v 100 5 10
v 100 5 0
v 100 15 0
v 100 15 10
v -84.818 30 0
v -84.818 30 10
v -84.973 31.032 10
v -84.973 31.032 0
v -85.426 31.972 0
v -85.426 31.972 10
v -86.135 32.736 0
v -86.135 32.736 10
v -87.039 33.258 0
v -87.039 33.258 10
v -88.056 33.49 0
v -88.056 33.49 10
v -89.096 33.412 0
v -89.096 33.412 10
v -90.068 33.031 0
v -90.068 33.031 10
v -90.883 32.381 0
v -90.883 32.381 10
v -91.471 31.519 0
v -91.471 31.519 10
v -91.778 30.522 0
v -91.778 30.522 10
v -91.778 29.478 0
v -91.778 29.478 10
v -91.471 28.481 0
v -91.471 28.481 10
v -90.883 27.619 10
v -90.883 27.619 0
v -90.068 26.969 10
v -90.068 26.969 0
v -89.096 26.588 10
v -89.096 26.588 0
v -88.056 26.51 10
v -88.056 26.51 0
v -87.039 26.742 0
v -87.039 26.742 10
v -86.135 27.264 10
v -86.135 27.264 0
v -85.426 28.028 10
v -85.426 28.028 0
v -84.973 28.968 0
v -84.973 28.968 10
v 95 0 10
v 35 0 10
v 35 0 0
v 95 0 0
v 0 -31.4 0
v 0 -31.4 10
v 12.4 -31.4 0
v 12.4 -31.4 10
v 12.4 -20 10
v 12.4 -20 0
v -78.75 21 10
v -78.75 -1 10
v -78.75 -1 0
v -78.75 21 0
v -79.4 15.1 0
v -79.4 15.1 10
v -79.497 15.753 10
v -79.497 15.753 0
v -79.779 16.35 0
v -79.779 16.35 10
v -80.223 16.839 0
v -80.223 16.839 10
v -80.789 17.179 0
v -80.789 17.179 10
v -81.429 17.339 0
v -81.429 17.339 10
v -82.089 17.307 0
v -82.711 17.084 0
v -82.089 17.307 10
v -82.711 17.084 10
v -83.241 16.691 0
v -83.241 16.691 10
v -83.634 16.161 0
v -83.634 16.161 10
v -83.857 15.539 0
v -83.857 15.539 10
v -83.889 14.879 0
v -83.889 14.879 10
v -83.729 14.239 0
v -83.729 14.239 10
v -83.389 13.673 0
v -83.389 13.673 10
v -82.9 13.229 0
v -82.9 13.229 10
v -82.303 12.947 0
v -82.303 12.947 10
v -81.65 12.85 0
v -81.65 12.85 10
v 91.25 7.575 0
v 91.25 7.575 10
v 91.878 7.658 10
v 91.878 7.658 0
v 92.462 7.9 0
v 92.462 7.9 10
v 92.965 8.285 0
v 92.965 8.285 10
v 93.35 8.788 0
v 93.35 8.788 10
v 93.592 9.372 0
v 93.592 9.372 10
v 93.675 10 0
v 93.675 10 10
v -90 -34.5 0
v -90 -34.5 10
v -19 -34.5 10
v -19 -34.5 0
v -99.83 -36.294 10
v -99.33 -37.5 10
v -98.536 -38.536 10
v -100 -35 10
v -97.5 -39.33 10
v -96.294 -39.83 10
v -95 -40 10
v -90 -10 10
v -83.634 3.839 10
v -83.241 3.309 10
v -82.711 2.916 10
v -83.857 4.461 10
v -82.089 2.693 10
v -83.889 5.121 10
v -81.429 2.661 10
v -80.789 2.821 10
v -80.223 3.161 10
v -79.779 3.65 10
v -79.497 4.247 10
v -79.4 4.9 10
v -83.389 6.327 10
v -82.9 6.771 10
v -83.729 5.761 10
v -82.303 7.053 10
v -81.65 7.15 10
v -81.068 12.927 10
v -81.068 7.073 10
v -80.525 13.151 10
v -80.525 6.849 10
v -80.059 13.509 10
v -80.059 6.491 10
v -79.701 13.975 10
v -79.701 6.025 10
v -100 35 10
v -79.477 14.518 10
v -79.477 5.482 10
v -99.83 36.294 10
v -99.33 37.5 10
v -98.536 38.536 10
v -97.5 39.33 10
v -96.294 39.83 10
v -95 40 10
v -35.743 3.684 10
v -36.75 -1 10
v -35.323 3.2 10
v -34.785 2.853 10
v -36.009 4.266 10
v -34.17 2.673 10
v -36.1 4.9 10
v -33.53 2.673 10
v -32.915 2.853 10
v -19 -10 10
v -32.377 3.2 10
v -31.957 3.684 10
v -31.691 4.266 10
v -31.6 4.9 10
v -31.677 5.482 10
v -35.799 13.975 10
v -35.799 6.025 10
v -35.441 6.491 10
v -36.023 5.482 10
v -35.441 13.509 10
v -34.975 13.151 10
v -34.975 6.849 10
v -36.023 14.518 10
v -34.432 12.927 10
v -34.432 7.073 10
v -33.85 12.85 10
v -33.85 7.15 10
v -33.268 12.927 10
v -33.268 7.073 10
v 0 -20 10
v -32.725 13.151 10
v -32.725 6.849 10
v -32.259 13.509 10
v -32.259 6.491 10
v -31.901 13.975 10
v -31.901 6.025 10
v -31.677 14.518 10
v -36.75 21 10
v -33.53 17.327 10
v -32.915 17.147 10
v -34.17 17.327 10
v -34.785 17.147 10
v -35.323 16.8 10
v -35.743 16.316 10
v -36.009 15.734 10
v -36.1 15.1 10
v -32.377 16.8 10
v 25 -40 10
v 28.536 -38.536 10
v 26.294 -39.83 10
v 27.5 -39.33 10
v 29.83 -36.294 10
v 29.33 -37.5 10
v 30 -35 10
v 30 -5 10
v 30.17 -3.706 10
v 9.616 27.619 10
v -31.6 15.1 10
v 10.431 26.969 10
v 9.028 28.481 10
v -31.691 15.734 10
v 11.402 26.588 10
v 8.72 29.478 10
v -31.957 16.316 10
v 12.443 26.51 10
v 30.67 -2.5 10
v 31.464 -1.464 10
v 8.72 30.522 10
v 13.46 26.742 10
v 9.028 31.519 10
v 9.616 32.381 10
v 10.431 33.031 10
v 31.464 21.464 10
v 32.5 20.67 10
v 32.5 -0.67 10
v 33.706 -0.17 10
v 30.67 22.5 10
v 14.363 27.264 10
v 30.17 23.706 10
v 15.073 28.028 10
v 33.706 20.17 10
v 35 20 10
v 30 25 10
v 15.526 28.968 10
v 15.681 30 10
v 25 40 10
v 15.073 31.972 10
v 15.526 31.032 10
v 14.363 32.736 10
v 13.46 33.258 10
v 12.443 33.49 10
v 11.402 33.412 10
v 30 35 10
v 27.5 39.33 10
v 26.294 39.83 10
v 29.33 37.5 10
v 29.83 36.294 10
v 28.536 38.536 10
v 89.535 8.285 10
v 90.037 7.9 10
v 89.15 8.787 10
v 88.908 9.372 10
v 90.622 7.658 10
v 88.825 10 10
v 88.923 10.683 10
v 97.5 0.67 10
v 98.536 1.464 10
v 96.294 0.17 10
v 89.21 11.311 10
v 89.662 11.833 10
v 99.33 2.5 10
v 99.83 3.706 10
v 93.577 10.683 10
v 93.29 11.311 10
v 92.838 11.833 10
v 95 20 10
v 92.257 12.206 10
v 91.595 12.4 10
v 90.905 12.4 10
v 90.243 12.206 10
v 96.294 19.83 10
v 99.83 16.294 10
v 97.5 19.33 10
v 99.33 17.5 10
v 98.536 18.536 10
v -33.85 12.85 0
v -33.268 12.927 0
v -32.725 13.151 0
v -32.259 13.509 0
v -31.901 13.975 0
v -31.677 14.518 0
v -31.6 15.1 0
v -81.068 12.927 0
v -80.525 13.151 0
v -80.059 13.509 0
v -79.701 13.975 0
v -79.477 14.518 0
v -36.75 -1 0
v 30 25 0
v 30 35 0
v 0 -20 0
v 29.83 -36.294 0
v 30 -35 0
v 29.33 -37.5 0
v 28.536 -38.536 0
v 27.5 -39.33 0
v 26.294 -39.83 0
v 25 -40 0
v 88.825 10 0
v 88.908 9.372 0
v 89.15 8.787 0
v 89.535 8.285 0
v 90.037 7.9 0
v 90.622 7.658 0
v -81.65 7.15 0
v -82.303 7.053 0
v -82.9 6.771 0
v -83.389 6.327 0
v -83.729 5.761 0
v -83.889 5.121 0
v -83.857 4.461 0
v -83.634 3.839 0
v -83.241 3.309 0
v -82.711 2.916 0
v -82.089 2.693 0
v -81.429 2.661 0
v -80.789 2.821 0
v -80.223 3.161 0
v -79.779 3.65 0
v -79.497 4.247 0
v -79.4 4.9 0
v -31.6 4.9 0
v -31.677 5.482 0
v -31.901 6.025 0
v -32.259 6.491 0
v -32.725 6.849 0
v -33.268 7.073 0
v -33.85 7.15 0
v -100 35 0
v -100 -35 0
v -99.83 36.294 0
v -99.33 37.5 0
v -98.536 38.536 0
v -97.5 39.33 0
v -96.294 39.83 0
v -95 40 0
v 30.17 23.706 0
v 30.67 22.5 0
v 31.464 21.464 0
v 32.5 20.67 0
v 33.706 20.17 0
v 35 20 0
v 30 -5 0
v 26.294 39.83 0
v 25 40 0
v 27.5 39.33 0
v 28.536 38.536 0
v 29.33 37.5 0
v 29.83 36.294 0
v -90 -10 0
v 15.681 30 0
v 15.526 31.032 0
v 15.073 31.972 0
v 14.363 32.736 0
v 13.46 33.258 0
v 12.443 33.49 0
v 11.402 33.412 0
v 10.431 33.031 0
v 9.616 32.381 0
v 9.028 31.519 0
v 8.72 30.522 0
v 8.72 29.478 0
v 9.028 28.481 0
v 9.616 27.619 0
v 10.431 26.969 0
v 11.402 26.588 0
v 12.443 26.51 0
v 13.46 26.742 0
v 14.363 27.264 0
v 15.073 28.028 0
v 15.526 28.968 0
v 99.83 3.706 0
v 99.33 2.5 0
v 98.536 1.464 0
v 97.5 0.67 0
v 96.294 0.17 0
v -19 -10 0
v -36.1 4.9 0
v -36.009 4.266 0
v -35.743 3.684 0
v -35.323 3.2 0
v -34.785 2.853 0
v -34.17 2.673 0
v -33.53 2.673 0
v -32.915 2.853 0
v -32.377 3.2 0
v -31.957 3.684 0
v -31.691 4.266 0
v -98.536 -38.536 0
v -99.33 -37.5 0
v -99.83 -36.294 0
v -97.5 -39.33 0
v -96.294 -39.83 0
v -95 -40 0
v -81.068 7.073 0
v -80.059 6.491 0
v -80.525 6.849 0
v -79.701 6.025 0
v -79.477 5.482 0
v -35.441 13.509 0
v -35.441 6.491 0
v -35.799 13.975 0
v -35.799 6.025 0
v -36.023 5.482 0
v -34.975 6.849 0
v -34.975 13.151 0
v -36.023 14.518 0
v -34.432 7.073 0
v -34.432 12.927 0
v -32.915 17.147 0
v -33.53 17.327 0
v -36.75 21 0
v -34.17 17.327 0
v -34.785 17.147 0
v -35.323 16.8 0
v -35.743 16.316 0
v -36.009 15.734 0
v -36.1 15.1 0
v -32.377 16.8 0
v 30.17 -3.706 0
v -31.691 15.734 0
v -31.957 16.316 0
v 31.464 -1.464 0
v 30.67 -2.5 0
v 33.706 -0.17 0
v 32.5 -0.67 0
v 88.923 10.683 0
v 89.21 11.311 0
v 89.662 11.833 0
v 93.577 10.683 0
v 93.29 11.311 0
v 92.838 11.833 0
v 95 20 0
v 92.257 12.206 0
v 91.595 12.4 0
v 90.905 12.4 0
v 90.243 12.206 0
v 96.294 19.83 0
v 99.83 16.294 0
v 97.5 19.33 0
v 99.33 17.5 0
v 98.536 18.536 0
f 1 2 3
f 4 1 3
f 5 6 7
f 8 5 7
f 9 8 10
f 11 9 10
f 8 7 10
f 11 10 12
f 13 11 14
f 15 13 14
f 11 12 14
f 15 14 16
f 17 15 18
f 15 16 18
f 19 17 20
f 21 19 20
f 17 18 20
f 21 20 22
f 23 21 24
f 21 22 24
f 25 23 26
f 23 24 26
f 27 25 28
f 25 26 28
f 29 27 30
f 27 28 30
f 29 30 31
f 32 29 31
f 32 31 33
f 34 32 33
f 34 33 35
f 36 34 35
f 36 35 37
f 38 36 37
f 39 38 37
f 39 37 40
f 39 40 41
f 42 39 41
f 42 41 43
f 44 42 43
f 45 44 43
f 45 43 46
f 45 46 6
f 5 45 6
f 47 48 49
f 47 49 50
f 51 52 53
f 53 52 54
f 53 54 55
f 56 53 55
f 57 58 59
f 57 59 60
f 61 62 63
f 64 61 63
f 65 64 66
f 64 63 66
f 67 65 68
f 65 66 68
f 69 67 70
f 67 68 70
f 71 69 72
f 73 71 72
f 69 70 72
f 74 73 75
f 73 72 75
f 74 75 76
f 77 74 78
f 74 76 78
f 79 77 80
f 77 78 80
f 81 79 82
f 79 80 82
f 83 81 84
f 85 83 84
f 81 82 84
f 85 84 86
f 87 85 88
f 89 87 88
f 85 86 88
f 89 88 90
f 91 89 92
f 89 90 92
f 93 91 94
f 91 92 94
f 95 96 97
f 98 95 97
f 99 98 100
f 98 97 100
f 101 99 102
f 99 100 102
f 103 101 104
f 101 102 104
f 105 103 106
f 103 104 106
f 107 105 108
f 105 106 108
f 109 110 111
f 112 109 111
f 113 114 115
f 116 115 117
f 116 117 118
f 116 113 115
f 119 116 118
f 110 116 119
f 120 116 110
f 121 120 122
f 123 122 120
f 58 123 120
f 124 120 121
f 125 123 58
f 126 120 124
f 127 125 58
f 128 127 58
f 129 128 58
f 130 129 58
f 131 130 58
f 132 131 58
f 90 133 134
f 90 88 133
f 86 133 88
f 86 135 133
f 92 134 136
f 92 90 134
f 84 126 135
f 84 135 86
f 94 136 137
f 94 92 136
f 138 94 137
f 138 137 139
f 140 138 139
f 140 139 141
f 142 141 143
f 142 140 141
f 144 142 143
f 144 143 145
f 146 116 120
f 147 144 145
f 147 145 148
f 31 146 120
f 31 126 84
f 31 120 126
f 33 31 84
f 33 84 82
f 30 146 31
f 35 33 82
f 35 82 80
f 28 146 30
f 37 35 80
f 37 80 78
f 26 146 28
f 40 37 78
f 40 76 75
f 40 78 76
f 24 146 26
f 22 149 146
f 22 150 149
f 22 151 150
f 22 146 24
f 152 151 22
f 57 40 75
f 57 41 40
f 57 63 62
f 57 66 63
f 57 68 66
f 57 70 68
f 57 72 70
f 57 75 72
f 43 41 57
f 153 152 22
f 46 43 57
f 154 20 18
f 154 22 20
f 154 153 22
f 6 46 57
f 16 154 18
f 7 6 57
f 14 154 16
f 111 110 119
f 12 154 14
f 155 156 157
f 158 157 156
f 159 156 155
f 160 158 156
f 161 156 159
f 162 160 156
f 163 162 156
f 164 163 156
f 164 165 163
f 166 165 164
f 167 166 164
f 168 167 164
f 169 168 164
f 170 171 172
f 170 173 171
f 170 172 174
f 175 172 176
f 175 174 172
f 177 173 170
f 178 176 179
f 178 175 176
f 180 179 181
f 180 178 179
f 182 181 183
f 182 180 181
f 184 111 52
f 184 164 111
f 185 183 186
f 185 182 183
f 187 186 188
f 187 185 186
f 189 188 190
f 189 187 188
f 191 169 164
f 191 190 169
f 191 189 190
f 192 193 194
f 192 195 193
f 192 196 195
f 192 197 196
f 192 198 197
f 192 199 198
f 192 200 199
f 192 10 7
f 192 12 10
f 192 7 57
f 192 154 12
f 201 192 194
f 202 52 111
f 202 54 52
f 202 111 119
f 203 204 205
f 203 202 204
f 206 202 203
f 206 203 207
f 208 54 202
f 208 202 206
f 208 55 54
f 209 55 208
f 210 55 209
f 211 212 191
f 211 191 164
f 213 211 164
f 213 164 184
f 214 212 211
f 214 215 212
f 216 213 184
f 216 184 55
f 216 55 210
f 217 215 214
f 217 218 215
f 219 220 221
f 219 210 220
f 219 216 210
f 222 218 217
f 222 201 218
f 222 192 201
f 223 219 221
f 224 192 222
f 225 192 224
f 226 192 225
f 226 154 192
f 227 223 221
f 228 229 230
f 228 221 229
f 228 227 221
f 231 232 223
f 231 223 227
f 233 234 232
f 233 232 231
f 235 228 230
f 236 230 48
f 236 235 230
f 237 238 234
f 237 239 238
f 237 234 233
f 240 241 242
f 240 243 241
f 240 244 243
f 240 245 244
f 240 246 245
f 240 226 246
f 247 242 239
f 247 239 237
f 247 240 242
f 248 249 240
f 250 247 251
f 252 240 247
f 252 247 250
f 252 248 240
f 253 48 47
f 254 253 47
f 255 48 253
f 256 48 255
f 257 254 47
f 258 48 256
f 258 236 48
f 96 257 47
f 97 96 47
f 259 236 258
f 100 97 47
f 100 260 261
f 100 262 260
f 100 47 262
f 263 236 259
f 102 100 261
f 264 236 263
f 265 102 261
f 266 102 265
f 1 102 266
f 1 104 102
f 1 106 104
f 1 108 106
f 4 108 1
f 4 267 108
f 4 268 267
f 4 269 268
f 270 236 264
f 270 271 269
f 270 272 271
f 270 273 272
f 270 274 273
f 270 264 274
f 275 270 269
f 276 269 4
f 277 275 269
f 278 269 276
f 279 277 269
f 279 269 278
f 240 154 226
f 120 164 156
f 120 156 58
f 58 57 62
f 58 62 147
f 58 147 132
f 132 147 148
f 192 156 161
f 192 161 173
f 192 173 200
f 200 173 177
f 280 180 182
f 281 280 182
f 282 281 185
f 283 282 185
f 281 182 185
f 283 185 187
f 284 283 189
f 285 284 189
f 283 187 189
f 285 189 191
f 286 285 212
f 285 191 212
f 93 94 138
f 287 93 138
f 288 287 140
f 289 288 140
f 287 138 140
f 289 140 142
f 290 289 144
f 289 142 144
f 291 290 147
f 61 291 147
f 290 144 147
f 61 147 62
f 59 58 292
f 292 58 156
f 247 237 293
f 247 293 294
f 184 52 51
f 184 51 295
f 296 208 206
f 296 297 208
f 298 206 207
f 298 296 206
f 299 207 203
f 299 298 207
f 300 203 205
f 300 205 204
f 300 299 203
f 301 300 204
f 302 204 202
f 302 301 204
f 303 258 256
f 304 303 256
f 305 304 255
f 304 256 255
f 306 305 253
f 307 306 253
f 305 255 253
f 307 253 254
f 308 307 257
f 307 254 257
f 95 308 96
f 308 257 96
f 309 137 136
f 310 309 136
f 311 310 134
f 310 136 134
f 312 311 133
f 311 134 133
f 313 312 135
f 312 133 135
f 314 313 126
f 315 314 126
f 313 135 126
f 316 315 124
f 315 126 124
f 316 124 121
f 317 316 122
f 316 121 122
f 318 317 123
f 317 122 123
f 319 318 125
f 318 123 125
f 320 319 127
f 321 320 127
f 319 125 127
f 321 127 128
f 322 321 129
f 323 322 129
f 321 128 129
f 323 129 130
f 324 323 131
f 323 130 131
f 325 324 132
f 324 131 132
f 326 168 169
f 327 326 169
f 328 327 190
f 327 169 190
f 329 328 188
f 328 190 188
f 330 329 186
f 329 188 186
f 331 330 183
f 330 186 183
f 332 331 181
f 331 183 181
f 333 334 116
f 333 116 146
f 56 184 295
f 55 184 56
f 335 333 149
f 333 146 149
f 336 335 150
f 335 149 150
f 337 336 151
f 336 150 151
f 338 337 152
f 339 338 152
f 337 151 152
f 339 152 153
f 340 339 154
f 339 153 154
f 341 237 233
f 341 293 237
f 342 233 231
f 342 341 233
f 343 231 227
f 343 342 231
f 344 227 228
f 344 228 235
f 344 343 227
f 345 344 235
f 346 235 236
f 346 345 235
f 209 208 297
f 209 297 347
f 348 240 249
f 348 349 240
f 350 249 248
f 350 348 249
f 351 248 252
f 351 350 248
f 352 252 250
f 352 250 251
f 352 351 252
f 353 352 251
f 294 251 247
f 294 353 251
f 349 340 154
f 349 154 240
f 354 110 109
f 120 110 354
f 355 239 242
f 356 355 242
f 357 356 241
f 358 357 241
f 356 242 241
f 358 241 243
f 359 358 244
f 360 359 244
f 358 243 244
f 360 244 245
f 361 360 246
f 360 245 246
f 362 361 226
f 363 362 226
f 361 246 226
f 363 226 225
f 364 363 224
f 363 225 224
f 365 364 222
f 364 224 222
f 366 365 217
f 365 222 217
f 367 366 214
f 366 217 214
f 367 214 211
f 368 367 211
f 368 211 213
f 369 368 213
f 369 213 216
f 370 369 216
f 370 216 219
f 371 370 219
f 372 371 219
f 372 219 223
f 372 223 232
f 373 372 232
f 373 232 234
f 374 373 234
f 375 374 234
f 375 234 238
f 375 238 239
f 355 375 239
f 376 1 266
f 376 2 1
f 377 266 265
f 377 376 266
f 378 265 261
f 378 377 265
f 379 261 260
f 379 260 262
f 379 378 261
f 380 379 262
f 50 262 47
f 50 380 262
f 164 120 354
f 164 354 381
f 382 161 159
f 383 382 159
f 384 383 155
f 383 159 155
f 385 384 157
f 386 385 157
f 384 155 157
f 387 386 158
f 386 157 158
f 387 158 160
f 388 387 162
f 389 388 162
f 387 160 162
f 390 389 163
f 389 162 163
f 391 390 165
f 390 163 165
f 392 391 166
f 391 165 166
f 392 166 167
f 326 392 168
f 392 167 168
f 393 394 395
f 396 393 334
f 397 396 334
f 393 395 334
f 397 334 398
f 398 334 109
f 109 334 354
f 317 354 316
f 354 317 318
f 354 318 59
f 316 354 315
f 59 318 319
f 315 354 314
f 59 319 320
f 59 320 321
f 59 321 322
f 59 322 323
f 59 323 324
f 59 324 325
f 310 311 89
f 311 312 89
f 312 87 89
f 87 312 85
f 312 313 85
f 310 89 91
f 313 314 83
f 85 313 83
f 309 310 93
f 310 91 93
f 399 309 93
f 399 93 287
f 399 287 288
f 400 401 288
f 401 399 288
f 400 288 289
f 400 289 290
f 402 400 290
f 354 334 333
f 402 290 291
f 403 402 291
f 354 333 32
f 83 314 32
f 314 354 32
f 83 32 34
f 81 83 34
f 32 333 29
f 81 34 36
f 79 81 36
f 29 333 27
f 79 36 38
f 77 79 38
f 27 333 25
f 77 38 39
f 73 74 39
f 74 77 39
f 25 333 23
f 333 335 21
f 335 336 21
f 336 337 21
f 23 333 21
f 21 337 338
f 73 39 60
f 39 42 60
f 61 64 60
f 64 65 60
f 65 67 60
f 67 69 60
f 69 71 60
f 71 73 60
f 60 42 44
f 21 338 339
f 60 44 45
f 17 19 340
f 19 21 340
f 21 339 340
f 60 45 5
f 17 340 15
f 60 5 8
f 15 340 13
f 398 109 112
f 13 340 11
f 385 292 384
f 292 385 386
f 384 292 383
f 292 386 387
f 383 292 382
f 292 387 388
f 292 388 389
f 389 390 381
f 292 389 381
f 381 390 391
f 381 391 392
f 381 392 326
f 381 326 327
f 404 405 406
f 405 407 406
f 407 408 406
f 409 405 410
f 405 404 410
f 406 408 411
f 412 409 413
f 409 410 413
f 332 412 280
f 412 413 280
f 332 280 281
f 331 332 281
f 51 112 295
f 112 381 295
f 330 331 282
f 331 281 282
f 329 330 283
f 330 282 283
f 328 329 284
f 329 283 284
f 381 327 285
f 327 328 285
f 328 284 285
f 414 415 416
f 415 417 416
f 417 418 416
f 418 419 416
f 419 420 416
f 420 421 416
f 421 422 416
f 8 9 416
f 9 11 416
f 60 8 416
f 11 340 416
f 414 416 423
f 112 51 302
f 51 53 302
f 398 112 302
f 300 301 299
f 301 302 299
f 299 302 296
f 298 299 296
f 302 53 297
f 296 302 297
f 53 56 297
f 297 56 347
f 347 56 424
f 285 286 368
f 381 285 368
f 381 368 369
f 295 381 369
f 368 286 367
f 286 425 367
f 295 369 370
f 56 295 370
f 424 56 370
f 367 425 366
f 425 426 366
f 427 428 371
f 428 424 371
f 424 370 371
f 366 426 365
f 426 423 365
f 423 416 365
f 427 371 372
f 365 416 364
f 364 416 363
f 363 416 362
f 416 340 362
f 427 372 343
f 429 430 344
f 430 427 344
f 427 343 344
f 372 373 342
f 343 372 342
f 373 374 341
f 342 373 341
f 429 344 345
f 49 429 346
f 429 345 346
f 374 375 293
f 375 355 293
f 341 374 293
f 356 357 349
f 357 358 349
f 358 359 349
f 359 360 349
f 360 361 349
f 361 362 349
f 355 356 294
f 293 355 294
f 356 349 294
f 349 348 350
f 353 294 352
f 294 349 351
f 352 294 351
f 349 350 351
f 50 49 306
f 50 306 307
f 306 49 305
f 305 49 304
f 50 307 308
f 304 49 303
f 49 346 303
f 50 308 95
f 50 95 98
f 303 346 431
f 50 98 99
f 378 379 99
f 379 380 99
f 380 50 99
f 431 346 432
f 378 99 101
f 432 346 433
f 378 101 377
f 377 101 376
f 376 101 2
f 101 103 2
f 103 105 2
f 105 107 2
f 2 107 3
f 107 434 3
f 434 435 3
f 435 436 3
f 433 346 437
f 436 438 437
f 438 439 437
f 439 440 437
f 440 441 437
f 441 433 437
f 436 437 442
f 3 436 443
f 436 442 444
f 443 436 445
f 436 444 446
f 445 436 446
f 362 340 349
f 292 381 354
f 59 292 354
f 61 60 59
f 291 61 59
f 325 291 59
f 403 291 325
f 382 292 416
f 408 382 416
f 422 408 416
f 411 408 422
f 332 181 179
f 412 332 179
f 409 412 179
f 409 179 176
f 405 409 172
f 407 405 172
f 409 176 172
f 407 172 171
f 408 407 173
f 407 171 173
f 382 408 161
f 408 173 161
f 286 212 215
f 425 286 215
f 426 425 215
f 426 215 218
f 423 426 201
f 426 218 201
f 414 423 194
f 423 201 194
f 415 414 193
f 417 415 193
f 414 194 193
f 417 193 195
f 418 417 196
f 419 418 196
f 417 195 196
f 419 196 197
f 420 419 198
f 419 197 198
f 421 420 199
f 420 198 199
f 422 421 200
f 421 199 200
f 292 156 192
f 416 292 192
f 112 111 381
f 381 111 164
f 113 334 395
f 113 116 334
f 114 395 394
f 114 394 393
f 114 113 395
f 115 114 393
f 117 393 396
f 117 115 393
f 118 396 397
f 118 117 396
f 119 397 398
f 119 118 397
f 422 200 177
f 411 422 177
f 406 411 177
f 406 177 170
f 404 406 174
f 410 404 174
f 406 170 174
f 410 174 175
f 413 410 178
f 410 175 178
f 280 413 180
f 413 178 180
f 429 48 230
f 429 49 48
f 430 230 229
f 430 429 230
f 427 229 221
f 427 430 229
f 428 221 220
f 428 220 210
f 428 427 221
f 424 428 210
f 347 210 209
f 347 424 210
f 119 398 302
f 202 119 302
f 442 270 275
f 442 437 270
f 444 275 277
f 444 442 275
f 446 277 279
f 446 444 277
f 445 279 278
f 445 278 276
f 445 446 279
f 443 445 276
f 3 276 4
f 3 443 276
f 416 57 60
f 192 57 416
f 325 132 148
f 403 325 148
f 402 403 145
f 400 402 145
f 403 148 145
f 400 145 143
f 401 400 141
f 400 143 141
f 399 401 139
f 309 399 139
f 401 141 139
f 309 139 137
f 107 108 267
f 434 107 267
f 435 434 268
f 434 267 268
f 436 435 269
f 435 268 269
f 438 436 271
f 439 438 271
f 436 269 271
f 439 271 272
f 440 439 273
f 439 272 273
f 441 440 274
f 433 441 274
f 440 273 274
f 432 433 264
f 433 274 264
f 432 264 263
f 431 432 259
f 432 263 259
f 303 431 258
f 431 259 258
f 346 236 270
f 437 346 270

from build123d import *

# Parameters (mm, degrees)
F0_W      = 200
F0_H      = 80
F1_DEPTH  = 10
F2_W      = 42
F2_H      = 22
F3_DEPTH  = 10.001
F5_DEPTH  = 10.001
F6_R      = 3.5
F7_DEPTH  = 10.001
F8_R      = 5
F11_W     = 70
F11_H     = 20
F11_H_2   = 40
F9_W      = 12.4
F9_H      = 11.4
F12_DEPTH = 10.001
F13_R     = 5
F14_W     = 71
F14_H     = 24.5
F15_DEPTH = 10.001


with BuildPart() as f1:
    # F0 (on Top) → F1 (new body)
    with BuildSketch(Plane.XY):
        Rectangle(F0_W, F0_H)
    extrude(amount=F1_DEPTH)

    # F2 (on face) → F3 (cut, through all)
    with BuildSketch(Plane.XY.offset(10)):
        with Locations((-57.7500068545, 10)):
            Rectangle(F2_W, F2_H)
    extrude(amount=-F3_DEPTH, mode=Mode.SUBTRACT)

    # F4 (on face) → F5 (cut, through all)
    with BuildSketch(Plane.XY.offset(10)):
        with BuildLine():
            Line((-81.6500068545, 12.85), (-81.6500068545, 15.1))
            Line((-81.6500068545, 15.1), (-79.4000068545, 15.1))
            ThreePointArc((-79.4000068545, 15.1), (-83.2409971122, 16.6909902577), (-81.6500068545, 12.85))
        make_face()
        with BuildLine():
            Line((-79.4000068545, 15.1), (-81.6500068545, 15.1))
            Line((-81.6500068545, 15.1), (-81.6500068545, 12.85))
            ThreePointArc((-81.6500068545, 12.85), (-80.0590165969, 13.5090097423), (-79.4000068545, 15.1))
        make_face()
        with BuildLine():
            Line((-81.6500068545, 4.9), (-81.6500068545, 7.15))
            ThreePointArc((-81.6500068545, 7.15), (-83.2409971122, 3.3090097423), (-79.4000068545, 4.9))
            Line((-79.4000068545, 4.9), (-81.6500068545, 4.9))
        make_face()
        with BuildLine():
            ThreePointArc((-79.4000068545, 4.9), (-80.0590165969, 6.4909902577), (-81.6500068545, 7.15))
            Line((-81.6500068545, 7.15), (-81.6500068545, 4.9))
            Line((-81.6500068545, 4.9), (-79.4000068545, 4.9))
        make_face()
        with BuildLine():
            Line((-33.8500068545, 15.1), (-36.1000068545, 15.1))
            ThreePointArc((-36.1000068545, 15.1), (-35.4409971122, 13.5090097423), (-33.8500068545, 12.85))
            Line((-33.8500068545, 12.85), (-33.8500068545, 15.1))
        make_face()
        with BuildLine():
            ThreePointArc((-31.6000068545, 15.1), (-33.8500068545, 17.35), (-36.1000068545, 15.1))
            Line((-36.1000068545, 15.1), (-33.8500068545, 15.1))
            Line((-33.8500068545, 15.1), (-33.8500068545, 12.85))
            ThreePointArc((-33.8500068545, 12.85), (-32.2590165969, 13.5090097423), (-31.6000068545, 15.1))
        make_face()
        with BuildLine():
            ThreePointArc((-33.8500068545, 7.15), (-35.4409971122, 6.4909902577), (-36.1000068545, 4.9))
            Line((-36.1000068545, 4.9), (-33.8500068545, 4.9))
            Line((-33.8500068545, 4.9), (-33.8500068545, 7.15))
        make_face()
        with BuildLine():
            Line((-33.8500068545, 4.9), (-36.1000068545, 4.9))
            ThreePointArc((-36.1000068545, 4.9), (-33.8500068545, 2.65), (-31.6000068545, 4.9))
            ThreePointArc((-31.6000068545, 4.9), (-32.2590165969, 6.4909902577), (-33.8500068545, 7.15))
            Line((-33.8500068545, 7.15), (-33.8500068545, 4.9))
        make_face()
    extrude(amount=-F5_DEPTH, mode=Mode.SUBTRACT)

    # F6 (on face) → F7 (cut, through all)
    with BuildSketch(Plane.XY.offset(10)):
        with Locations((-88.3175069503, 30)):
            Circle(F6_R)
        with Locations((12.1812492609, 30)):
            Circle(F6_R)
    extrude(amount=-F7_DEPTH, mode=Mode.SUBTRACT)

    # F8
    f8_edges = [f1.edges().sort_by_distance(p)[0] for p in [
        (-100, 40, 5),
        (-100, -40, 5),
        (100, 40, 5),
        (100, -40, 5),
    ]]
    fillet(f8_edges, radius=F8_R)

    # F11 (on face) + F10 (on face) + F9 (on face) → F12 (cut, through all)
    with BuildSketch(Plane.XY.offset(10)):
        with Locations((65, 30)):
            Rectangle(F11_W, F11_H)
        with Locations((65, -20)):
            Rectangle(F11_W, F11_H_2)
    with BuildSketch(Plane.XY.offset(10)):
        with BuildLine():
            ThreePointArc((93.6749931455, 10), (91.2499931455, 12.425), (88.8249931455, 10))
            Line((88.8249931455, 10), (91.2499931455, 10))
            Line((91.2499931455, 10), (91.2499931455, 7.575))
            ThreePointArc((91.2499931455, 7.575), (92.9647270898, 8.2852660556), (93.6749931455, 10))
        make_face()
        with BuildLine():
            Line((91.2499931455, 10), (88.8249931455, 10))
            ThreePointArc((88.8249931455, 10), (89.5352592011, 8.2852660556), (91.2499931455, 7.575))
            Line((91.2499931455, 7.575), (91.2499931455, 10))
        make_face()
    with BuildSketch(Plane.XY.offset(10)):
        with Locations((6.2, -25.7)):
            Rectangle(F9_W, F9_H)
    extrude(amount=-F12_DEPTH, mode=Mode.SUBTRACT)

    # F13
    f13_edges = [f1.edges().sort_by_distance(p)[0] for p in [
        (30, 40, 5),
        (30, 20, 5),
        (100, 20, 5),
        (30, -40, 5),
        (100, 0, 5),
        (30, 0, 5),
    ]]
    fillet(f13_edges, radius=F13_R)

    # F14 (on face) → F15 (cut, through all)
    with BuildSketch(Plane.XY.offset(10)):
        with Locations((-54.5, -22.25)):
            Rectangle(F14_W, F14_H)
    extrude(amount=-F15_DEPTH, mode=Mode.SUBTRACT)


solid = f1.part
